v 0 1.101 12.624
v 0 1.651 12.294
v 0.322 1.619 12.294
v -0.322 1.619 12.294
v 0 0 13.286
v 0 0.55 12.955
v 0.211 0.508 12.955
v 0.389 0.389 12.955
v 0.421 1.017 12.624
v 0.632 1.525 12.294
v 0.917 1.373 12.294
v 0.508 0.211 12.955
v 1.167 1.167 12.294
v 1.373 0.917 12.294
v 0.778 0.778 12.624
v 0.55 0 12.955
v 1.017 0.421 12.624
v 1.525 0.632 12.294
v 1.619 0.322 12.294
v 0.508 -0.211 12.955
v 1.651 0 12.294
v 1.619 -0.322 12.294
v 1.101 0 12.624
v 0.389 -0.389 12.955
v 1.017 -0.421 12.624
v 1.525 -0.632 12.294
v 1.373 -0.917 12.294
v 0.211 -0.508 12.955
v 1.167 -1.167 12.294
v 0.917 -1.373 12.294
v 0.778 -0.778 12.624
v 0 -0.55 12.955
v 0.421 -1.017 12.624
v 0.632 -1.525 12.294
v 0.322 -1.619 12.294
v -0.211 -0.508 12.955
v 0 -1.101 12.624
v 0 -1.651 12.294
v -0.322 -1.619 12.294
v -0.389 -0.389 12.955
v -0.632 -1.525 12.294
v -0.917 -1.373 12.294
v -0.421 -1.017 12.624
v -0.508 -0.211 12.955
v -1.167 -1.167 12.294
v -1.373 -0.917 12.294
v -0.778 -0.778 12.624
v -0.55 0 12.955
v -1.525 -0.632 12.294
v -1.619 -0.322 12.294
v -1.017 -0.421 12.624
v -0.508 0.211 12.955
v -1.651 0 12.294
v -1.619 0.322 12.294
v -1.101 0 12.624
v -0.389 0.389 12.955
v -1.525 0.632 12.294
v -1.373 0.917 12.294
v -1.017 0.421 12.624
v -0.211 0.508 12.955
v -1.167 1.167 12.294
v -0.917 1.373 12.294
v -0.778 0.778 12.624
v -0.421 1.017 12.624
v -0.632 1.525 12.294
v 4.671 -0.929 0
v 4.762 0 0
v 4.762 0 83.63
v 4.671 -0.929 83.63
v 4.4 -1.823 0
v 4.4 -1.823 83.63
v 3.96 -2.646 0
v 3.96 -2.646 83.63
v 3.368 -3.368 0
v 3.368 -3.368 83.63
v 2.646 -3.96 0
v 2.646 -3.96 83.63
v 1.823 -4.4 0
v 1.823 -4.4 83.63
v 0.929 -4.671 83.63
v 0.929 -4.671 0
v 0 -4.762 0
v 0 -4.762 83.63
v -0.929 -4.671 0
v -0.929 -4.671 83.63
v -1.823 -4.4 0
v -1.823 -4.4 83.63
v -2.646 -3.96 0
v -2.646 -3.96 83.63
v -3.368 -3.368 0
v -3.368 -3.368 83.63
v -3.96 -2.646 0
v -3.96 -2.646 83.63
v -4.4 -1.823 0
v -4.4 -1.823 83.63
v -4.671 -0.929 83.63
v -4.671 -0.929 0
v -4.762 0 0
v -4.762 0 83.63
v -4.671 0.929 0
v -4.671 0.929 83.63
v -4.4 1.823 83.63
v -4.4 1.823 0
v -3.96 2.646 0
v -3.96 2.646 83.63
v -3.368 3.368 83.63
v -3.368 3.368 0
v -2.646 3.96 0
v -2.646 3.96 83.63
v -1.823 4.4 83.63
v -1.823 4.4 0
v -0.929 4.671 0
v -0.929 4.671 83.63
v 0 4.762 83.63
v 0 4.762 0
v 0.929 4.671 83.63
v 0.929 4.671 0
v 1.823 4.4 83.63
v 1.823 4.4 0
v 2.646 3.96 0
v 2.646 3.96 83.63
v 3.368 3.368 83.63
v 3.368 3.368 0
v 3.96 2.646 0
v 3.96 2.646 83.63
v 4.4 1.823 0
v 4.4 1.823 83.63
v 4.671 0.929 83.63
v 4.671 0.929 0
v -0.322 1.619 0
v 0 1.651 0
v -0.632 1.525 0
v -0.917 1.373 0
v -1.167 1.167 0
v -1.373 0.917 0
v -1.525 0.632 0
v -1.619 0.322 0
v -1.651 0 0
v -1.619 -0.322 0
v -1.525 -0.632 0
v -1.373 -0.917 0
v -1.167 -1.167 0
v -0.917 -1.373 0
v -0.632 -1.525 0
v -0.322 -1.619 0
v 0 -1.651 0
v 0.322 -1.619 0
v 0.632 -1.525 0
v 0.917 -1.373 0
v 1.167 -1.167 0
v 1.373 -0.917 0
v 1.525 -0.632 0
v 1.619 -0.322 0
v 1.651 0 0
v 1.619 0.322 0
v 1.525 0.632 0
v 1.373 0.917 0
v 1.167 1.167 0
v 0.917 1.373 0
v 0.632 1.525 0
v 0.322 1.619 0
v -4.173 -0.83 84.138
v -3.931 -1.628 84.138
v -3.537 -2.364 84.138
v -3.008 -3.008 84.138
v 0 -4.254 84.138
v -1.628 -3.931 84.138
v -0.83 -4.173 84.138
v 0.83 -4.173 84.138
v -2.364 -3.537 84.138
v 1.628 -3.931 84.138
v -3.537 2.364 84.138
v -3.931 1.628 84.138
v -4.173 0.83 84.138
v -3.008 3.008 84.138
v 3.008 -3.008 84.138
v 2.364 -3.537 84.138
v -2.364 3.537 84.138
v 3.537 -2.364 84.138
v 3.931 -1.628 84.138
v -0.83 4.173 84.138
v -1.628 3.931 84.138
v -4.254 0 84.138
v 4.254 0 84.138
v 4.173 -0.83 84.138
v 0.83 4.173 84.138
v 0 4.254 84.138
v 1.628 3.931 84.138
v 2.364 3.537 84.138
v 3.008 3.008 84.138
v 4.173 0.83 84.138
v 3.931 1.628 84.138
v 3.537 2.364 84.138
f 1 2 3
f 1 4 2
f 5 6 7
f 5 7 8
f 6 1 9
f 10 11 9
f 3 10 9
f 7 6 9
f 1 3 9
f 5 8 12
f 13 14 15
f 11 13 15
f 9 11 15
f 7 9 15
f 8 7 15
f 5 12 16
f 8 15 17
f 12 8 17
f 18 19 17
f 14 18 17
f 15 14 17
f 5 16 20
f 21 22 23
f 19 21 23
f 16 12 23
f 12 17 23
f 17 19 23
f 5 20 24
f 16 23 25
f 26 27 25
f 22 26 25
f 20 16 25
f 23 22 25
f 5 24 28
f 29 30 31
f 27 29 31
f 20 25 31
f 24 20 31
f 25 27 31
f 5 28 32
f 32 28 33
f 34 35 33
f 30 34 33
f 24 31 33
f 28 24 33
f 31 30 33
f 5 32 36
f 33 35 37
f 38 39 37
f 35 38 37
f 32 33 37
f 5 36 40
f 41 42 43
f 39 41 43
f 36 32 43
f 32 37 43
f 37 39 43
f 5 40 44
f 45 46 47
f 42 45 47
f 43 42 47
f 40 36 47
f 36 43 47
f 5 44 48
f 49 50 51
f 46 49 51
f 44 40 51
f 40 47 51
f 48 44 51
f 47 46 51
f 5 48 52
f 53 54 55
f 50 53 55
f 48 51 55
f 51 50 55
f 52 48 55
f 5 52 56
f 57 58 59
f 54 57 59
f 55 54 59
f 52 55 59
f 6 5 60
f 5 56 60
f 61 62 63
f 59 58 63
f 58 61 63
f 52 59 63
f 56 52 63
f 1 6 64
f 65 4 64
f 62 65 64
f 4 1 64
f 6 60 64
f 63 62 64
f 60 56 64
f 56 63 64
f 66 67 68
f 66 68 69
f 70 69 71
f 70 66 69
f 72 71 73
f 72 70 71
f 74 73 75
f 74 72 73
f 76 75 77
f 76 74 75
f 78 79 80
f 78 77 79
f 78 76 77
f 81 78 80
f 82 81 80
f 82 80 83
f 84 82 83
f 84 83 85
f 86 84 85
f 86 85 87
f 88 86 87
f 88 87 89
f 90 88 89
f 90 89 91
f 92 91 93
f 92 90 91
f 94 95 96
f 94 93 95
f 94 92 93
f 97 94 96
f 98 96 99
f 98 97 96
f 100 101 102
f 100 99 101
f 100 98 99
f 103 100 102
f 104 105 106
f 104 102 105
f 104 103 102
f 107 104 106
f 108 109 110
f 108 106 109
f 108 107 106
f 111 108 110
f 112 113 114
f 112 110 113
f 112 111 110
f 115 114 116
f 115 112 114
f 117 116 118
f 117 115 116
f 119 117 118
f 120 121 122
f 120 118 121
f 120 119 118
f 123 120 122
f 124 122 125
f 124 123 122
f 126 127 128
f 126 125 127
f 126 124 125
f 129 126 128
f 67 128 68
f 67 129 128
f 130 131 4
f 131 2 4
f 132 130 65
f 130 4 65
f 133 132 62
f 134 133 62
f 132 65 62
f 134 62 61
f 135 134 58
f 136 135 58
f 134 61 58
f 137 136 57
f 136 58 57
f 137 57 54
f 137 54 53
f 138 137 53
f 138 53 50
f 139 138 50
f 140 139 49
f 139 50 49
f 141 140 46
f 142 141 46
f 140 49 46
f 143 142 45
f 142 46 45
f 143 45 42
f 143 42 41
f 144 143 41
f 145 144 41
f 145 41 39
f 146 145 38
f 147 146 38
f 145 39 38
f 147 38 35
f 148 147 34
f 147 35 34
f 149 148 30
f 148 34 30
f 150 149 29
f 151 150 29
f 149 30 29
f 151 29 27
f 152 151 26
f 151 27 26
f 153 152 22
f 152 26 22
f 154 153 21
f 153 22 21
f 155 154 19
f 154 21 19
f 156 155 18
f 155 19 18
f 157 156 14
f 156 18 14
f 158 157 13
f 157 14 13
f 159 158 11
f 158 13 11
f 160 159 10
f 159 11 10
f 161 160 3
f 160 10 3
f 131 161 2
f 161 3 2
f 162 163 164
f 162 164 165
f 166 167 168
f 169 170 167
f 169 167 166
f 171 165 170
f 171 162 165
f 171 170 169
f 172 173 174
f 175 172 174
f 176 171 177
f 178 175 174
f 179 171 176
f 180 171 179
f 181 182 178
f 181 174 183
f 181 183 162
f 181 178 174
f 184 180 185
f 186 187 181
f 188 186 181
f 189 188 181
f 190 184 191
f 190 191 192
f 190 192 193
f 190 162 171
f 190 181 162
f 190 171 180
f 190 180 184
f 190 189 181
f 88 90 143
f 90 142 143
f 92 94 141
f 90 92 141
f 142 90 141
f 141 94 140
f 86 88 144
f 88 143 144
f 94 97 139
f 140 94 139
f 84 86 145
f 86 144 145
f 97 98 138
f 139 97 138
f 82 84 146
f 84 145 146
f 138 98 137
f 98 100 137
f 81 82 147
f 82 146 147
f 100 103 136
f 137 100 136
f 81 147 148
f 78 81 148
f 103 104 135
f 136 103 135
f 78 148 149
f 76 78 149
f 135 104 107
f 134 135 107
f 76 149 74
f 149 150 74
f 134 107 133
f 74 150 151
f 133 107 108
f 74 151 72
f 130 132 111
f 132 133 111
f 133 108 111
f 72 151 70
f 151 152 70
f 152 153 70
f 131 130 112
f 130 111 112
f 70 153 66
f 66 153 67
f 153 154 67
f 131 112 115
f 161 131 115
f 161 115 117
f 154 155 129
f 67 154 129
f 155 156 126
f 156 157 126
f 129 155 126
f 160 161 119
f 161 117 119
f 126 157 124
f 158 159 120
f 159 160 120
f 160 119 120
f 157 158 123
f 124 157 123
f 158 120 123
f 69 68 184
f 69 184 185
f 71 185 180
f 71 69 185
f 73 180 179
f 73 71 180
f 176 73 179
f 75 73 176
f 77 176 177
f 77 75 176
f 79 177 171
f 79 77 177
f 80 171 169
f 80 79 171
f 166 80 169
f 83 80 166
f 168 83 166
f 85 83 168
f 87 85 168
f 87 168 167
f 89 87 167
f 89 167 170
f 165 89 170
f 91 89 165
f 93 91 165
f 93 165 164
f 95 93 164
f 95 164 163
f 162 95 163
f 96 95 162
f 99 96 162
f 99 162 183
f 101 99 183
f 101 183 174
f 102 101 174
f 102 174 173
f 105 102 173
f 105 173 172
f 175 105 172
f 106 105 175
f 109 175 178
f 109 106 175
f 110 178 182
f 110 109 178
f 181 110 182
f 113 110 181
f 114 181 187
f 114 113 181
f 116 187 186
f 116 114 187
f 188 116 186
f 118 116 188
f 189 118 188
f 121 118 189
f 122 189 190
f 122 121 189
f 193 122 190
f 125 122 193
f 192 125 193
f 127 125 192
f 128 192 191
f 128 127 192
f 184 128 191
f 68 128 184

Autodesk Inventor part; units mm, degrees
ref_plane "YZ Plane" through (0, 0, 0) normal (1, 0, 0) x (0, 1, 0)
ref_plane "XZ Plane" through (0, 0, 0) normal (0, 1, 0) x (-1, 0, 0)
ref_plane "XY Plane" through (0, 0, 0) normal (0, 0, 1) x (1, 0, 0)
sketch "Sketch1" plane through (0, 0, 0) normal (0, 0, 1) x (1, 0, 0)
  circle A0 centre (0, 0) radius 4.7625
  dimension "d0" = 9.525
extrude "Extrusion1" add sketch "Sketch1" along normal blind 84.1375
sketch "Sketch2" plane through (0, 0, 0) normal (0, 0, -1) x (-1, 0, 0)
  point P0 (0, 0)
  point P1 (0, 0)
hole "Hole1" at (0, 0, 0) direction (0, 0, 1) diameter 3.302 depth 12.2936 tip angle 118 thread size "8-32 UNC" class "2B" standard "ANSI Unified Screw Threads"
chamfer "Chamfer1" distance 0.508 angle 45 1 edges at (-4.7625, 0, 84.1375)
properties part number "post"
